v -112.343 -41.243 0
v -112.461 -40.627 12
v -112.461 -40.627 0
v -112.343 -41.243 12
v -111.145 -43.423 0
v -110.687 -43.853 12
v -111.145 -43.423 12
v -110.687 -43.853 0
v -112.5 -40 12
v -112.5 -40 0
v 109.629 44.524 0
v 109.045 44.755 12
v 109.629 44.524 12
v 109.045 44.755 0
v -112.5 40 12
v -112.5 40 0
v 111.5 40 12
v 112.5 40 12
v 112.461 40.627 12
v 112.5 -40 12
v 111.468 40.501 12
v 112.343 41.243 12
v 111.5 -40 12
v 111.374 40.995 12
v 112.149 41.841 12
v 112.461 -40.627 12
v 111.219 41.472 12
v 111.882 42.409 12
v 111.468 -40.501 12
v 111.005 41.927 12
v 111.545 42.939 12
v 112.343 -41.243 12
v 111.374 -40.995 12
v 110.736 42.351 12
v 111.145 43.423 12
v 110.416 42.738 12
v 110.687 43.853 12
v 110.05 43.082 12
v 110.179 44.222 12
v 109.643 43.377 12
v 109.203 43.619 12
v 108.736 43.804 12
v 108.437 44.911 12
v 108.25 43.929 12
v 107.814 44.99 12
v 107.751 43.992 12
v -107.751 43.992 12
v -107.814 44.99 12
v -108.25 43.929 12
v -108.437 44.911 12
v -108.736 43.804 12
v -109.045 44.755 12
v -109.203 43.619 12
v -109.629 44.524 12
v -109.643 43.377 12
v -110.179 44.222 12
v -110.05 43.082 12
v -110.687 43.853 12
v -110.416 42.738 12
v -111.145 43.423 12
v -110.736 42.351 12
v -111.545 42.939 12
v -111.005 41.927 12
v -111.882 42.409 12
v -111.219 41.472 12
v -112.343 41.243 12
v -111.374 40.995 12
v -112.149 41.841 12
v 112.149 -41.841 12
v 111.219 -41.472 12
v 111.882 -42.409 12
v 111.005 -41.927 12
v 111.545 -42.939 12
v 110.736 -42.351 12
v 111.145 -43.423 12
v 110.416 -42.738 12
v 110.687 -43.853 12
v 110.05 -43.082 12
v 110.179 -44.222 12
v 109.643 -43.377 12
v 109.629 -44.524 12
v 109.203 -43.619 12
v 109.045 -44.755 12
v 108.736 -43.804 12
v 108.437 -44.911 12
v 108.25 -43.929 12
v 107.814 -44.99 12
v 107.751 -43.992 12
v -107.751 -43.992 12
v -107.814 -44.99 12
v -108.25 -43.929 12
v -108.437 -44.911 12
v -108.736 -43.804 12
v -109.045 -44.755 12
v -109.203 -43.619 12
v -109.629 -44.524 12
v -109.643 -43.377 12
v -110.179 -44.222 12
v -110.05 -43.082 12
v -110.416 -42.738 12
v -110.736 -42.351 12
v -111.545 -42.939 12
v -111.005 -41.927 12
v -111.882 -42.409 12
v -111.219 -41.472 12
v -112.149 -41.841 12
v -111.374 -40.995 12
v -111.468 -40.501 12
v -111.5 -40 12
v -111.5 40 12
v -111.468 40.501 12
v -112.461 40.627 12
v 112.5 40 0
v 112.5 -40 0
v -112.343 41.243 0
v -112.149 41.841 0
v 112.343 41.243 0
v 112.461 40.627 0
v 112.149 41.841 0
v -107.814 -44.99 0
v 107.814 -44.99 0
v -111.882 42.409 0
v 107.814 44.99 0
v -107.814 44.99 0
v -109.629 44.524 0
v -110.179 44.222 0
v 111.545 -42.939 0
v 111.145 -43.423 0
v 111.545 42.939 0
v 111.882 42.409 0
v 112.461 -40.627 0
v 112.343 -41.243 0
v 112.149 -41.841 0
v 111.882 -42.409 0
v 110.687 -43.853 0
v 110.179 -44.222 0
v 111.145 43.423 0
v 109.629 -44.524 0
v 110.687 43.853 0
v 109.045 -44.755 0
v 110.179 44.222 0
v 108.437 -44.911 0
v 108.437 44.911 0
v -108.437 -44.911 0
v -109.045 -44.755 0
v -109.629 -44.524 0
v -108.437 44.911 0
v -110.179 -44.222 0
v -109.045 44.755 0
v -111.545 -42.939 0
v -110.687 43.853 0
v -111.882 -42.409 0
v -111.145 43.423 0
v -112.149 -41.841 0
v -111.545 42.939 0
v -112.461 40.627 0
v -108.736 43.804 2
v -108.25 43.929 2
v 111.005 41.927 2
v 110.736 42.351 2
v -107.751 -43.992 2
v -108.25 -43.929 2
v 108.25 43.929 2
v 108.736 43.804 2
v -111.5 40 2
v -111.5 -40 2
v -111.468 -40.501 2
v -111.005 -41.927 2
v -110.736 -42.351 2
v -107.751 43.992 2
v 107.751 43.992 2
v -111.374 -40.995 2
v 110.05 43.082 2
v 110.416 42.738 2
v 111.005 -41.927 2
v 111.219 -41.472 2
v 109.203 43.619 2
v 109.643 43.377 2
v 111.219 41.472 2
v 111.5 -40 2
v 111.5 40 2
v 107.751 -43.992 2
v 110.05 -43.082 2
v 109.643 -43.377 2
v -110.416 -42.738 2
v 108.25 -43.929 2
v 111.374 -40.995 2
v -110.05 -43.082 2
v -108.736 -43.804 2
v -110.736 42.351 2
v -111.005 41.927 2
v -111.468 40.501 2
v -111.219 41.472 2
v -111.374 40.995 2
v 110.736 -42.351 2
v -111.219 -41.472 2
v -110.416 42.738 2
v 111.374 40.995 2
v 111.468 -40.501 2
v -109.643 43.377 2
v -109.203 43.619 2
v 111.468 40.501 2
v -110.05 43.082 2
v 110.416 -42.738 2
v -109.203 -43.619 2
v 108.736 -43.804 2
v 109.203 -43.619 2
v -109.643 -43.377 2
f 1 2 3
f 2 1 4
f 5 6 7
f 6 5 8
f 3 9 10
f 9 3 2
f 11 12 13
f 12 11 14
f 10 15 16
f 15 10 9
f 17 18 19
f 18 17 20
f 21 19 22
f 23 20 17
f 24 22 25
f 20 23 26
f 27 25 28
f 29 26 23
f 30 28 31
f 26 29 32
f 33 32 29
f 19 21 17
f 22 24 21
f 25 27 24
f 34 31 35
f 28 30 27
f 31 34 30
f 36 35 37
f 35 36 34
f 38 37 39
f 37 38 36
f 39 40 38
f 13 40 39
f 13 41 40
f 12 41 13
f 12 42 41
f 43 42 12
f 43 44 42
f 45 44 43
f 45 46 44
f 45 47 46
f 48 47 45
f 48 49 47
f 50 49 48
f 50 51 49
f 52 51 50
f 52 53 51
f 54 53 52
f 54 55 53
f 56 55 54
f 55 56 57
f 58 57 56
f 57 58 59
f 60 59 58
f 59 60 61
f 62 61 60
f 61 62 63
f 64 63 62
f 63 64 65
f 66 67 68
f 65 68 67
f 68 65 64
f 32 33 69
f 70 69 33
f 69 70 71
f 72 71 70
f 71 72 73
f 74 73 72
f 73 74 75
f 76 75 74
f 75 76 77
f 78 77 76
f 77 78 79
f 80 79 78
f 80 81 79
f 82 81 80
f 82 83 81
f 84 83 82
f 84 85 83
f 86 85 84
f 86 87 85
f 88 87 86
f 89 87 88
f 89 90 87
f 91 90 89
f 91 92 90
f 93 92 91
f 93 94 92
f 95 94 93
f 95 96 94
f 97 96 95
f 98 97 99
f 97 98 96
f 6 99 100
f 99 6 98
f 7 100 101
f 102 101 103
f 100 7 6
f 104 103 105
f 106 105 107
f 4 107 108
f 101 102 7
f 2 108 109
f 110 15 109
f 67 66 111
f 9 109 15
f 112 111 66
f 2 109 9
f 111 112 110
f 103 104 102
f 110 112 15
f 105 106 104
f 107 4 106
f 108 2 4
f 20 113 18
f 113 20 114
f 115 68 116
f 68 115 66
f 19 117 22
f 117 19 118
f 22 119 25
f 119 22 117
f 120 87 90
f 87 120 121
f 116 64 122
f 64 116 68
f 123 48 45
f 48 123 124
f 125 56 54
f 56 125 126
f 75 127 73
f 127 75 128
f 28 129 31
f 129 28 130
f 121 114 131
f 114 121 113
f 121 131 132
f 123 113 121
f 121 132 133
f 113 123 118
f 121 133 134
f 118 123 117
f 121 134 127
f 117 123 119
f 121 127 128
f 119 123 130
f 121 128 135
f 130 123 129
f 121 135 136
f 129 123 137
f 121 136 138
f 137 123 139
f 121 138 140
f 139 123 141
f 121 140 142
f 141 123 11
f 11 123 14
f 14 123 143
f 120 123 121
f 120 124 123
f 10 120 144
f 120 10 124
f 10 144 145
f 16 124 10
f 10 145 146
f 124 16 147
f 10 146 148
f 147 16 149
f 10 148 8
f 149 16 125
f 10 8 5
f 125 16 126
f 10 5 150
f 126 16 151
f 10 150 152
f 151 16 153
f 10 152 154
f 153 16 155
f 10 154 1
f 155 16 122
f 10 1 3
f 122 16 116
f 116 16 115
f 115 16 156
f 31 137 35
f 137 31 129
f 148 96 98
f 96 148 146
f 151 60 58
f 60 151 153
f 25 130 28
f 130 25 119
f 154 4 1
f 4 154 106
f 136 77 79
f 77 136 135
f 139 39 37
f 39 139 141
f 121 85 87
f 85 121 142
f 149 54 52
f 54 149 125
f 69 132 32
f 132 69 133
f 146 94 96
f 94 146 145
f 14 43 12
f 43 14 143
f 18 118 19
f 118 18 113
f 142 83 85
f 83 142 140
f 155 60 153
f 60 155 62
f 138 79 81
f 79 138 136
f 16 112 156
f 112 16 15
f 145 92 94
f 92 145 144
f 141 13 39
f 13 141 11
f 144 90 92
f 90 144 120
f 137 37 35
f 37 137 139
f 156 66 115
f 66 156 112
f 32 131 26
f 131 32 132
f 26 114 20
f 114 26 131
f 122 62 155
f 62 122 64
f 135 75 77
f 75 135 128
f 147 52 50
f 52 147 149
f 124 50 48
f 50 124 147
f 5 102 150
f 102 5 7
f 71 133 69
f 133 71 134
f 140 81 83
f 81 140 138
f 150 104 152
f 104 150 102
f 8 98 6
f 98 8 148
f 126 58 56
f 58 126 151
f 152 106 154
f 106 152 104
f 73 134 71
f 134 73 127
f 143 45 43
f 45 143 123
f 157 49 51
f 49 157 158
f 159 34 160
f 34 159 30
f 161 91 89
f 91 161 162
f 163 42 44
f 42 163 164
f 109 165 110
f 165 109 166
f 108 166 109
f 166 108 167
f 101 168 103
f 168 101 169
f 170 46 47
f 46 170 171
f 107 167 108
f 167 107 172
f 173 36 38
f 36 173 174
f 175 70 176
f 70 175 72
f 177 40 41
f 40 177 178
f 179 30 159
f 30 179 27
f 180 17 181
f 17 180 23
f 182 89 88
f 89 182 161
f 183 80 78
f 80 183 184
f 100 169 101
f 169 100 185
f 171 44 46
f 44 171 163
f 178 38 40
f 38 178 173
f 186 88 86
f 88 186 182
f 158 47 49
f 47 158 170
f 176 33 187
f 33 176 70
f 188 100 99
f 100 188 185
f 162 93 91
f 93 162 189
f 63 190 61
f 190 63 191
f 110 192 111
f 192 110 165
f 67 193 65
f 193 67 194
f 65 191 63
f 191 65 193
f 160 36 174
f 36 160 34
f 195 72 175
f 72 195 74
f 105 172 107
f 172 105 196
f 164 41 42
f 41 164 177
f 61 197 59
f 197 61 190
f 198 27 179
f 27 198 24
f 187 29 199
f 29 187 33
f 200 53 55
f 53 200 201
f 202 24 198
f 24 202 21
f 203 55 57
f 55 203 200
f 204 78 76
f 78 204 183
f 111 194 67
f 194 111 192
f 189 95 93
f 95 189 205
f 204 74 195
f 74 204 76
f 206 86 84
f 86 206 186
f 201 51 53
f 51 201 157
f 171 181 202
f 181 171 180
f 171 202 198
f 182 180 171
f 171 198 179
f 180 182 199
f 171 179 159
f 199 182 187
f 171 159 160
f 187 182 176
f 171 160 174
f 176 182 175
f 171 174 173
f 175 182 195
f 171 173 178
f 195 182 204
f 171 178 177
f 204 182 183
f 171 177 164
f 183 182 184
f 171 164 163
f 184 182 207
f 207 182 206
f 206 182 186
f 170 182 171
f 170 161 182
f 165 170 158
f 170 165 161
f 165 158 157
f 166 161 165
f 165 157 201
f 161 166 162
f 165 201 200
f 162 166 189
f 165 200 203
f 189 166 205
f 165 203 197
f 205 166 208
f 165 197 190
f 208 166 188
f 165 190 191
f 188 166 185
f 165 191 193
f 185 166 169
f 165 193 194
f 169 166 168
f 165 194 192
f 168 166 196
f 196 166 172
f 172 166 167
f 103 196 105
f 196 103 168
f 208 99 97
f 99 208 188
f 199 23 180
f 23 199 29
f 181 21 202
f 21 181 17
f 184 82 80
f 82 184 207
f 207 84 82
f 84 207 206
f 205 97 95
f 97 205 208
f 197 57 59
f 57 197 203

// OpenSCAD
$fn = 50;


difference() {
	union() {
		hull() {
			translate(v = [-107.5000000000, 40.0000000000, 0]) {
				cylinder(h = 12, r = 5);
			}
			translate(v = [107.5000000000, 40.0000000000, 0]) {
				cylinder(h = 12, r = 5);
			}
			translate(v = [-107.5000000000, -40.0000000000, 0]) {
				cylinder(h = 12, r = 5);
			}
			translate(v = [107.5000000000, -40.0000000000, 0]) {
				cylinder(h = 12, r = 5);
			}
		}
	}
	union() {
		translate(v = [0, 0, 2]) {
			hull() {
				translate(v = [-107.5000000000, 40.0000000000, 0]) {
					cylinder(h = 10, r = 4);
				}
				translate(v = [107.5000000000, 40.0000000000, 0]) {
					cylinder(h = 10, r = 4);
				}
				translate(v = [-107.5000000000, -40.0000000000, 0]) {
					cylinder(h = 10, r = 4);
				}
				translate(v = [107.5000000000, -40.0000000000, 0]) {
					cylinder(h = 10, r = 4);
				}
			}
		}
	}
}
